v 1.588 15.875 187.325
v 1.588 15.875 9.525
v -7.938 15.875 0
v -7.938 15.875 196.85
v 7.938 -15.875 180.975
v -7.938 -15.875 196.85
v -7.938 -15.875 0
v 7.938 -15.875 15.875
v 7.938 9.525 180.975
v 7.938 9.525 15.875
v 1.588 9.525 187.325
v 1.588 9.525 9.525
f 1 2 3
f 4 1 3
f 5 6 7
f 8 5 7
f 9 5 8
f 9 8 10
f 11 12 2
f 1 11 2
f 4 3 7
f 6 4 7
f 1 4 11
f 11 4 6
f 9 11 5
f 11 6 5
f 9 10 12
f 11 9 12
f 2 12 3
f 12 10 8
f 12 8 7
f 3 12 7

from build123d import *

# Parameters (mm, degrees)
F1_DEPTH = 196.85
F3_DEPTH = 31.751


with BuildPart() as f1:
    # F0 (on Top) → F1 (new body)
    with BuildSketch(Plane.XY):
        Polygon((1.5875, 9.525), (1.5875, 15.875), (-7.9375, 15.875), (-7.9375, -15.875), (7.9375, -15.875), (7.9375, 9.525), align=None)
    extrude(amount=F1_DEPTH)

    # F2 (on face) → F3 (cut, through all)
    with BuildSketch(Plane.XZ.offset(15.875)):
        Polygon((7.9375, 196.85), (-7.9375, 196.85), (7.9375, 180.975), align=None)
        Polygon((7.9375, 15.875), (-7.9375, 0), (7.9375, 0), align=None)
    extrude(amount=-F3_DEPTH, mode=Mode.SUBTRACT)


solid = f1.part
